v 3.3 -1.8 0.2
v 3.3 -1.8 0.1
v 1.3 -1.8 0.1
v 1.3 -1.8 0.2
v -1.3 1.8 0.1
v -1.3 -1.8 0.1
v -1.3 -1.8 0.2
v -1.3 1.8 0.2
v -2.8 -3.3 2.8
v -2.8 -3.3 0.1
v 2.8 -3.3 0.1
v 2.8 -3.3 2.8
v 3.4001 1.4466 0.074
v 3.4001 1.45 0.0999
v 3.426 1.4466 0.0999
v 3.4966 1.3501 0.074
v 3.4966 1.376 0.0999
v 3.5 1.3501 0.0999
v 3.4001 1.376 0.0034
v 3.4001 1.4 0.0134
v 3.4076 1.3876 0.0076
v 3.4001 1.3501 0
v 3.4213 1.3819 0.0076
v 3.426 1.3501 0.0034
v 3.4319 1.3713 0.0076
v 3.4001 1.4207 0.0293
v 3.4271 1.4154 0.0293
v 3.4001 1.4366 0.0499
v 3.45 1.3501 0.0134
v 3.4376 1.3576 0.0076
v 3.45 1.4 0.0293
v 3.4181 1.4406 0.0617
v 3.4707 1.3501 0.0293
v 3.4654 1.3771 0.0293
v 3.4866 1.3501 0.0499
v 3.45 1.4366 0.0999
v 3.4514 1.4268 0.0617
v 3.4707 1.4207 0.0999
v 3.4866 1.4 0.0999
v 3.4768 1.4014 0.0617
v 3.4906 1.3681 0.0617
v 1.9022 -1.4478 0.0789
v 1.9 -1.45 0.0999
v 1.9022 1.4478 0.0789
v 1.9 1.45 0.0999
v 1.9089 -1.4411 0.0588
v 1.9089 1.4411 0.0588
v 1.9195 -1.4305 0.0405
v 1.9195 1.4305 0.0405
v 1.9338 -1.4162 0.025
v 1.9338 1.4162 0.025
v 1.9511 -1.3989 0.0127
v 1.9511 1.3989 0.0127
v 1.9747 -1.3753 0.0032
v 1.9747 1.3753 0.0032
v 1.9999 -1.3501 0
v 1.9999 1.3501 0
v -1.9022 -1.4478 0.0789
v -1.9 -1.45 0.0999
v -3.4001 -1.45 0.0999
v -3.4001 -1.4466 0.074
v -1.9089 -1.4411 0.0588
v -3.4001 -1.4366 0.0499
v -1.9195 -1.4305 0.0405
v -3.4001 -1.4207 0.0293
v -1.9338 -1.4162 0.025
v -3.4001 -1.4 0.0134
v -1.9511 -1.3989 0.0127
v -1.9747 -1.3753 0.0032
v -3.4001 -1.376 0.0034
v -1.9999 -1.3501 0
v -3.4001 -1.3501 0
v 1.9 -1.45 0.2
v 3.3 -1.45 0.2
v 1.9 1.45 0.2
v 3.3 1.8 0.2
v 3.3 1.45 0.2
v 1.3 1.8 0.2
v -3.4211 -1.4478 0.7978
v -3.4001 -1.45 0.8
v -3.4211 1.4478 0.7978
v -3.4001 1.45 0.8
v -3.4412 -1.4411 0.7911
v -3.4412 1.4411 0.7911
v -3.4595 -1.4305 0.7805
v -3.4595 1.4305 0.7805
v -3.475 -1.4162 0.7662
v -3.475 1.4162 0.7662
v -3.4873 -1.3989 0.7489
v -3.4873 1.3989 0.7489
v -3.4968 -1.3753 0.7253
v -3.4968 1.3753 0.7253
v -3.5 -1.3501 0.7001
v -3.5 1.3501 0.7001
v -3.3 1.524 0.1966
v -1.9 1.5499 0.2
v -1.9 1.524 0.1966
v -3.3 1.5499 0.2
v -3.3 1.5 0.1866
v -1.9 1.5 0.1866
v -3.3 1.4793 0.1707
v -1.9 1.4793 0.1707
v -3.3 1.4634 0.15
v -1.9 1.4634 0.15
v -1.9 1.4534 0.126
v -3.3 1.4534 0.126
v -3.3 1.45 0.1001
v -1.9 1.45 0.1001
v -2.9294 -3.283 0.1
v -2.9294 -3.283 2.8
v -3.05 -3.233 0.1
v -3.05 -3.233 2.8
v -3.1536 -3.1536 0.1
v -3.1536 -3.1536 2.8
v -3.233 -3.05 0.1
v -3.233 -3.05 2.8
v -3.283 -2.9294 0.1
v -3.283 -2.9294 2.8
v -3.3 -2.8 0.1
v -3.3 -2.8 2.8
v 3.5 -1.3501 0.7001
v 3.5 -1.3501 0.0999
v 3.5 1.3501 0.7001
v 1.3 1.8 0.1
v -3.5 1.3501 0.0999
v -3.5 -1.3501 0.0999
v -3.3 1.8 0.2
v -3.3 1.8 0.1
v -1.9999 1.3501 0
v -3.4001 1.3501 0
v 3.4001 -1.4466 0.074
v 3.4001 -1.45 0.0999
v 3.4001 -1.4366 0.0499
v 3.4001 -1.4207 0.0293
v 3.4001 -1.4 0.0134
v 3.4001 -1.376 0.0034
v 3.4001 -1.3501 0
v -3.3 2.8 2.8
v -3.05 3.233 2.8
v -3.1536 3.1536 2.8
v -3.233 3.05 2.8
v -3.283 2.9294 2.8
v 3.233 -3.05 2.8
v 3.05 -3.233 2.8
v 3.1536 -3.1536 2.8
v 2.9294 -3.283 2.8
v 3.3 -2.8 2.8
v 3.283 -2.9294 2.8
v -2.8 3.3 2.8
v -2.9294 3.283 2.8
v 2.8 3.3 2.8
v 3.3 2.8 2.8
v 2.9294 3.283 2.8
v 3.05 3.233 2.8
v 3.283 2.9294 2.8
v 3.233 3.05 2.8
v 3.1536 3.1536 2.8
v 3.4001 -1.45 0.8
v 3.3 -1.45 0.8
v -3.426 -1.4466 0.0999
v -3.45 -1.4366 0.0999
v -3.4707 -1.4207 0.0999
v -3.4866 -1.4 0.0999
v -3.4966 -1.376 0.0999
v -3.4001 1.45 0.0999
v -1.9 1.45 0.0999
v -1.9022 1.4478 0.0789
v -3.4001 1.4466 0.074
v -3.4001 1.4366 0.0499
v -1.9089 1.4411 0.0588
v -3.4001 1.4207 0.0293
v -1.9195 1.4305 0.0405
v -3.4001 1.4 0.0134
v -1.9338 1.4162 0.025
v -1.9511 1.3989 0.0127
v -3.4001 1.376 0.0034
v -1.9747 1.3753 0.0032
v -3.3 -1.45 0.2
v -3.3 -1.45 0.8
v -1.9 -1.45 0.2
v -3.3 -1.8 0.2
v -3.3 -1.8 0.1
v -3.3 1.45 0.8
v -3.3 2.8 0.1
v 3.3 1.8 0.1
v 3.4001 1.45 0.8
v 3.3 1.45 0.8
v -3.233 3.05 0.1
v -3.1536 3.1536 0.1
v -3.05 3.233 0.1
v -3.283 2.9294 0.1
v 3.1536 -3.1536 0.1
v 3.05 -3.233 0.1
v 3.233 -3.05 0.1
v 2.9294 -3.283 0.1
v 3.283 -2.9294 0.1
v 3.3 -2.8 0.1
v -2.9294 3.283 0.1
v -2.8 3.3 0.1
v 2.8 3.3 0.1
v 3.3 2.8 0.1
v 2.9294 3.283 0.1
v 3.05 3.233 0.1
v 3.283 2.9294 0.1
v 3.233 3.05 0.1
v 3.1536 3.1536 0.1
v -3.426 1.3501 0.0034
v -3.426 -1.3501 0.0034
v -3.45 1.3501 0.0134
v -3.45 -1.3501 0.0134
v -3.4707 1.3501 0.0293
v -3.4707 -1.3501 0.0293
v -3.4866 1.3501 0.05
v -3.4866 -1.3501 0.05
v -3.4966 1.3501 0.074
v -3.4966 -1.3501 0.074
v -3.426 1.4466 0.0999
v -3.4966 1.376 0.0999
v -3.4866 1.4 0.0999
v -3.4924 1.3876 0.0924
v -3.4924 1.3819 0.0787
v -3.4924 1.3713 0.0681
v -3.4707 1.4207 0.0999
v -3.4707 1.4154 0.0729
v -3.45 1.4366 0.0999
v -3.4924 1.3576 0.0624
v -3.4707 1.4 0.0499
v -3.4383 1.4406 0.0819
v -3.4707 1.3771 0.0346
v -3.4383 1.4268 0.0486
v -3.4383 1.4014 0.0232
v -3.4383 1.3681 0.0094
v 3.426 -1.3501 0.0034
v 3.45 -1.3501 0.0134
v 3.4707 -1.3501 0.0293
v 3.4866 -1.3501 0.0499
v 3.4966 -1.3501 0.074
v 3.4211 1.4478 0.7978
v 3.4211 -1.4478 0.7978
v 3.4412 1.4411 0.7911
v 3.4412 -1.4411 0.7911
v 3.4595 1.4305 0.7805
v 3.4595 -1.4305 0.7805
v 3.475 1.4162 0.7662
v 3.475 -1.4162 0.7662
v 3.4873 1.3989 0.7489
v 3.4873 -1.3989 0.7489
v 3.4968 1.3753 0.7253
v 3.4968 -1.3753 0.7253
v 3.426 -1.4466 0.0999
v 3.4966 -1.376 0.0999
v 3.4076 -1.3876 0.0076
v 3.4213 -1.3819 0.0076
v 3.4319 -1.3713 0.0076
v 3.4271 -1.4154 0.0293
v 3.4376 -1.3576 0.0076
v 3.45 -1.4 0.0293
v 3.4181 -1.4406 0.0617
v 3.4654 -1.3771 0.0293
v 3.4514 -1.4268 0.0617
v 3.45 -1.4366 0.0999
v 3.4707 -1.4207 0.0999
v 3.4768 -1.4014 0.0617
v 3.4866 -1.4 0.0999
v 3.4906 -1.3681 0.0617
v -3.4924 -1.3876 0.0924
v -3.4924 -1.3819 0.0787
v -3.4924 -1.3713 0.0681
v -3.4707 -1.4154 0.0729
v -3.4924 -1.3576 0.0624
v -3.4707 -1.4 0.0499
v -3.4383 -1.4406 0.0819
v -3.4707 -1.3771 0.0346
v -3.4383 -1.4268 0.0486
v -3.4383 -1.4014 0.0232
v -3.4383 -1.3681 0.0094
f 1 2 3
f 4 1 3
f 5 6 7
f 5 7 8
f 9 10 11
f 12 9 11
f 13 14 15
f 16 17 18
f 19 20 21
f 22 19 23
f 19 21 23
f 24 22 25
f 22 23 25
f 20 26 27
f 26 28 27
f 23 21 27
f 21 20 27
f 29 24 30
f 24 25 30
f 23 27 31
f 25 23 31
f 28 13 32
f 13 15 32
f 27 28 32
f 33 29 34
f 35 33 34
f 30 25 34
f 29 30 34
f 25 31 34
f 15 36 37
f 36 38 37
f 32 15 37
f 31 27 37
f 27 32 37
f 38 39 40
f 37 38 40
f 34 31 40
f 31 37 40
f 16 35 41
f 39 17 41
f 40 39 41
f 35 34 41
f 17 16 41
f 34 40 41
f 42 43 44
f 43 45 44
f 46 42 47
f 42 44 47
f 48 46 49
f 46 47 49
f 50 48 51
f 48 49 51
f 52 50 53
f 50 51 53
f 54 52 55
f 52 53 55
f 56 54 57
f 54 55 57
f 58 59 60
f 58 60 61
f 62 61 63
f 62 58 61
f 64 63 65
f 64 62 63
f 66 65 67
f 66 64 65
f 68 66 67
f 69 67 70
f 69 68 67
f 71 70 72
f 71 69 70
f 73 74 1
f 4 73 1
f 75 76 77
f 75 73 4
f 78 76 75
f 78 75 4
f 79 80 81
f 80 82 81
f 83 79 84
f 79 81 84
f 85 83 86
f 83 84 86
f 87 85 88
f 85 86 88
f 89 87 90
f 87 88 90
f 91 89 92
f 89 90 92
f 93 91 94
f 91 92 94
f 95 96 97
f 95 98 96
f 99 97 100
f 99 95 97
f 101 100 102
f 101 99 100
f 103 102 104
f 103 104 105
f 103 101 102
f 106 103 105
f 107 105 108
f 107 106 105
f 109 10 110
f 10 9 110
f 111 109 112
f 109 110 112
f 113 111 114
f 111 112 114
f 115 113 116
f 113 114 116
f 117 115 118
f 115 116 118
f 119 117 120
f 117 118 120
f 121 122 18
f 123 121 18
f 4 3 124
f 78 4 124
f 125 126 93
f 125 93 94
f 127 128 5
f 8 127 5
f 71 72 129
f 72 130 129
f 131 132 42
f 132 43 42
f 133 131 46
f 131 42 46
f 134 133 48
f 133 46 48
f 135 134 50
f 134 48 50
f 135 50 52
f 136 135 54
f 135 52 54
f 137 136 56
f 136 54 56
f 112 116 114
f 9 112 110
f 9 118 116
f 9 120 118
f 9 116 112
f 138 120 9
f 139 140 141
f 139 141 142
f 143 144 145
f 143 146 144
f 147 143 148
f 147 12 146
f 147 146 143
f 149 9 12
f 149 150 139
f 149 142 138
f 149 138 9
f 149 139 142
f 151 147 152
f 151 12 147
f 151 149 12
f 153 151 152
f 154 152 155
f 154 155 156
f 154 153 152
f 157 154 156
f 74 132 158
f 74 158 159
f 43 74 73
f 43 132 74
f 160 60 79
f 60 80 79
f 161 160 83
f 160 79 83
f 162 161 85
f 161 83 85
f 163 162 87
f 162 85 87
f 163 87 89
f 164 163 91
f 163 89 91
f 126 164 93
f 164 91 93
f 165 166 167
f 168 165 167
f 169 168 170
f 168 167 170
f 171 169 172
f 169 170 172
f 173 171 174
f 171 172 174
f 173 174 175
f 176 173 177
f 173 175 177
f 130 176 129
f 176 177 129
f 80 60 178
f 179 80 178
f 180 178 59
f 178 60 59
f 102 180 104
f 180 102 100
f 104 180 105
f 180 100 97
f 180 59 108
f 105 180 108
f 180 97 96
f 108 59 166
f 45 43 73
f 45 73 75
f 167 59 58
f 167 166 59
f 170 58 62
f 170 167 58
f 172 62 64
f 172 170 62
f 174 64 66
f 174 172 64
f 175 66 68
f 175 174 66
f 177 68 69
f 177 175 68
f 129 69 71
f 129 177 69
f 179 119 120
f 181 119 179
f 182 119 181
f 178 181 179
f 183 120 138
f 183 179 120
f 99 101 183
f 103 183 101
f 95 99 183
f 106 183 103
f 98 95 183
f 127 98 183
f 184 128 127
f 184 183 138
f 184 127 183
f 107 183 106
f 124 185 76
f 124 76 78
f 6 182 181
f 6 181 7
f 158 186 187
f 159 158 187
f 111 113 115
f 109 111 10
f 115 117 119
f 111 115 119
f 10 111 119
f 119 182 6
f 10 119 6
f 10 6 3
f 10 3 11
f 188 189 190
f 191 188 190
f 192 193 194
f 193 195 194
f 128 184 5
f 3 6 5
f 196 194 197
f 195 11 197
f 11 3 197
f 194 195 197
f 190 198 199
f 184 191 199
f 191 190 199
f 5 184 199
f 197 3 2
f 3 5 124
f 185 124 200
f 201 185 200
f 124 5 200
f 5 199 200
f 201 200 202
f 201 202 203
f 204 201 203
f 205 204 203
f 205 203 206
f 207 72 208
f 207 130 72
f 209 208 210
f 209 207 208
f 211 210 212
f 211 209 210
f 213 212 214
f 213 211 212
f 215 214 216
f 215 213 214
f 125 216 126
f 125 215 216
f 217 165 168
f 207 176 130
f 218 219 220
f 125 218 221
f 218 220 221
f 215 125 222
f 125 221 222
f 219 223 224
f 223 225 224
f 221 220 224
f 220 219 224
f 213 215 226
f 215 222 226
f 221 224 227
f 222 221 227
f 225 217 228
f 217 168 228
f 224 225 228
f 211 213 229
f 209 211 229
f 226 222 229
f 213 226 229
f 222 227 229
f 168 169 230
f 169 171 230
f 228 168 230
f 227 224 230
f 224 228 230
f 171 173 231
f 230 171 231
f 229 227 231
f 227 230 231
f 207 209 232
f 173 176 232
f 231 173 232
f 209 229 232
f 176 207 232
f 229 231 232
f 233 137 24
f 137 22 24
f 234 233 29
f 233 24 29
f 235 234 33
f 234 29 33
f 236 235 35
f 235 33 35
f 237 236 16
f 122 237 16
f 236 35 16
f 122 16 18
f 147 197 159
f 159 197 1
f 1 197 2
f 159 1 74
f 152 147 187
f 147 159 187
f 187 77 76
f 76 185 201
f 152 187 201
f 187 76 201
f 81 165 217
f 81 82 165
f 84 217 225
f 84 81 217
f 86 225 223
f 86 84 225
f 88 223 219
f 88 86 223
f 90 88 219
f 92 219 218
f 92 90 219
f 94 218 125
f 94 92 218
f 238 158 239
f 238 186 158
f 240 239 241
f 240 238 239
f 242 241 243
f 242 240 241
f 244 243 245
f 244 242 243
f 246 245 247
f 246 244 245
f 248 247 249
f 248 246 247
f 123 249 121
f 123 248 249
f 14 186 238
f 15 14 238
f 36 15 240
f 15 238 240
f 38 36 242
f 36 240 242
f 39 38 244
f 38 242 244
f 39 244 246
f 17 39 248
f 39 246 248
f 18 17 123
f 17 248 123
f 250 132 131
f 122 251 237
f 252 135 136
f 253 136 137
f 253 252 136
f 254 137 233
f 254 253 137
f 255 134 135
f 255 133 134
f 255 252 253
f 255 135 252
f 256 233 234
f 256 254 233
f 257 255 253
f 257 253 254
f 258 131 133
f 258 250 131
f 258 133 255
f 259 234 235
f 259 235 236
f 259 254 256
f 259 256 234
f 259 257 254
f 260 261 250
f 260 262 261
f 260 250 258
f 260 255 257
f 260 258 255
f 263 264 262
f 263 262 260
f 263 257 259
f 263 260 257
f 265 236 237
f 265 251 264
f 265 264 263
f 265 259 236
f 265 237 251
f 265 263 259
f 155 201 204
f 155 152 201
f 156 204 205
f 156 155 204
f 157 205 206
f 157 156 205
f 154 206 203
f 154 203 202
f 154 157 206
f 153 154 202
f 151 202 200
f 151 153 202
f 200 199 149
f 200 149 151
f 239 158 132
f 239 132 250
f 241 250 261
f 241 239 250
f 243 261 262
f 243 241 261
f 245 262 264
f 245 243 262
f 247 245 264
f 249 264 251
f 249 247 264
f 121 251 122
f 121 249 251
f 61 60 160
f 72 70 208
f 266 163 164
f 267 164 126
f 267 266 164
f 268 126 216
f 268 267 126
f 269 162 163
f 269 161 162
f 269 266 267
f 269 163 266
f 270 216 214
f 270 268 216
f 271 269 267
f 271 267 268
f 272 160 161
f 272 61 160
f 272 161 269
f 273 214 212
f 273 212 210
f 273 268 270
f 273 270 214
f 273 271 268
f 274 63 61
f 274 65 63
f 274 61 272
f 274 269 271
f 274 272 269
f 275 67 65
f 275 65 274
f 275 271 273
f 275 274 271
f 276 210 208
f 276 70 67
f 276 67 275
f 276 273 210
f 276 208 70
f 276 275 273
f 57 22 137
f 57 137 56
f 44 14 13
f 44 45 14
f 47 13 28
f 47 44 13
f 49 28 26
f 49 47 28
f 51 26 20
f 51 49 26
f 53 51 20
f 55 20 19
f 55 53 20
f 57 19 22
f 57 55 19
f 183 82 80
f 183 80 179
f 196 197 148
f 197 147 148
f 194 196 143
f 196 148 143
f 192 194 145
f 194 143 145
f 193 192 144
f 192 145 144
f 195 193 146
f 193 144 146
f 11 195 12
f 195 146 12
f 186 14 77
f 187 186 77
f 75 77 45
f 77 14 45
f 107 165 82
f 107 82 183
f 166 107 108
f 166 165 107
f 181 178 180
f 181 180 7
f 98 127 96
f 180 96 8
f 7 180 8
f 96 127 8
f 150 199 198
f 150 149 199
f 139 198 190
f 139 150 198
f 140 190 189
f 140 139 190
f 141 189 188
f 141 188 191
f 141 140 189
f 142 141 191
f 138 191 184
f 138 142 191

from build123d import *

# Parameters (mm, degrees)
BOSS_EXTRUDE1_START = 0.1
SKETCH1_W           = 6.6
SKETCH1_H           = 6.6
BOSS_EXTRUDE1_DEPTH = 2.7
CUT_EXTRUDE1_START  = 0.1
SKETCH2_W           = 4
SKETCH2_H           = 3.6
CUT_EXTRUDE1_DEPTH  = 0.1
SKETCH3_W           = 1.6
SKETCH3_H           = 2.9
BOSS_EXTRUDE2_DEPTH = 0.8
FILLET1_R           = 0.5
FILLET2_R           = 0.1


with BuildPart() as part:
    # Sketch1 → Boss-Extrude1 (new body)
    with BuildSketch(Plane.XY.offset(BOSS_EXTRUDE1_START)):
        Rectangle(SKETCH1_W, SKETCH1_H)
    extrude(amount=BOSS_EXTRUDE1_DEPTH)

    # Sketch2 → Cut-Extrude1 (cut)
    with BuildSketch(Plane.XY.offset(CUT_EXTRUDE1_START)):
        with Locations((-3.3, 0)):
            Rectangle(SKETCH2_W, SKETCH2_H)
    cut_extrude1 = extrude(amount=CUT_EXTRUDE1_DEPTH, mode=Mode.SUBTRACT)

    # Mirror1: Cut-Extrude1 across plane
    add(cut_extrude1.mirror(Plane(origin=(0, 0, 0), x_dir=(0, 0, 1), z_dir=(1, 0, 0))), mode=Mode.SUBTRACT)

    # Sketch3 → Boss-Extrude2 (add)
    with BuildSketch(Plane.XY):
        with Locations((-2.7, 0)):
            Rectangle(SKETCH3_W, SKETCH3_H)
    boss_extrude2 = extrude(amount=BOSS_EXTRUDE2_DEPTH)

    # Mirror2: Boss-Extrude2 across plane
    add(boss_extrude2.mirror(Plane(origin=(0, 0, 0), x_dir=(0, 0, 1), z_dir=(1, 0, 0))))

    # Fillet1
    fillet1_edges = [part.edges().sort_by_distance(p)[0] for p in [
        (3.3, -3.3, 1.45),
        (-3.3, -3.3, 1.45),
        (-3.3, 3.3, 1.45),
        (3.3, 3.3, 1.45),
    ]]
    fillet(fillet1_edges, radius=FILLET1_R)

    # Fillet2
    fillet2_edges = [part.edges().sort_by_distance(p)[0] for p in [
        (3.5, -1.45, 0.4),
        (3.5, 0, 0.8),
        (3.5, 1.45, 0.4),
        (2.7, 1.45, 0),
        (1.9, 0, 0),
        (2.7, -1.45, 0),
        (3.5, 0, 0),
        (-2.7, -1.45, 0),
        (-1.9, 0, 0),
        (-2.7, 1.45, 0),
        (-3.5, 1.45, 0.4),
        (-3.5, 0, 0.8),
        (-3.5, -1.45, 0.4),
        (-3.5, 0, 0),
        (-2.6, 1.45, 0.2),
    ]]
    fillet(fillet2_edges, radius=FILLET2_R - 0.0001)  # a hair under: the kernel refuses the full size


solid = part.part
